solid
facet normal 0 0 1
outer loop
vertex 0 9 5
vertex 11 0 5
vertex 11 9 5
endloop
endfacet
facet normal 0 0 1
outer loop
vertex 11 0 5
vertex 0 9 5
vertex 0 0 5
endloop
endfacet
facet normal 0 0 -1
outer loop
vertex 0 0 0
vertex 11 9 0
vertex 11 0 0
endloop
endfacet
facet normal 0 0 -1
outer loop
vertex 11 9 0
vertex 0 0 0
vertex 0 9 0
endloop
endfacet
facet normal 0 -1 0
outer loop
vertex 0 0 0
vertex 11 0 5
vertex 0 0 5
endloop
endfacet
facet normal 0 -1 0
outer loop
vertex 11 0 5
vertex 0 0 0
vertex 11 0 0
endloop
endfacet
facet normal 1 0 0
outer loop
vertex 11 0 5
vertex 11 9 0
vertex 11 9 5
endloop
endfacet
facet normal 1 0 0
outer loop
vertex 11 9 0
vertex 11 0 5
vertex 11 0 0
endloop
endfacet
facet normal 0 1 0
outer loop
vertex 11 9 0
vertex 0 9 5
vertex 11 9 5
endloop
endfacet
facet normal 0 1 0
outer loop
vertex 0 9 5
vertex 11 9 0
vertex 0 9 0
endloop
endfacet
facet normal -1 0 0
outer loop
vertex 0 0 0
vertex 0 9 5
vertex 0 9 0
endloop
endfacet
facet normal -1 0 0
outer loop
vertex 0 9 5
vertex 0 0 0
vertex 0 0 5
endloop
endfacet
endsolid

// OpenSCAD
// Generated by SolidPython 1.0.1 on 2020-07-29 00:46:55


cube(size = [11, 9, 5]);
/***********************************************
*********      SolidPython code:      **********
************************************************
 
# import packages: SolidPython
from solid import *
from solid.utils import *
from itertools import chain, combinations, permutations


class Resize:

    def __init__(self, scad_file):
        self.scad_file = scad_file
        #self.scad_file = import_scad(scad_file)
        # cone/cylinder param:
        self.r1 = 0
        self.r2 = 0
        self.h = 0
        # rectangular prism param:
        self.w = 0
        self.l = 0
        # ellipse param:
        self.r = 0

    # import OpenScad code (file name corresponds to shape)


    # classify shape + parameters
    def assign(self, param1, param2, param3):
        if self.scad_file == 'cone.scad':
            self.r1 = param1
            self.r2 = param2
            self.h = param3
        elif self.scad_file == 'cylinder.scad':
            self.r1 = param1
            self.r2 = param2
            self.h = param3
        elif self.scad_file == 'rectangularPrism.scad':
            self.h = param1
            self.l = param2
            self.w = param3
        else:
            self.r = param1
            self.h = param2

    # resize parameters
    def iterate(self):
        x = range(3, 20, 2)
        i = 1
        if self.scad_file == 'cone.scad':
            tempList = list(permutations(x, 2))
            for temp in tempList:
                param1 = temp[0]
                param2 = temp[1]
                filepath = 'produced_scad_files/' + 'cone' + str(param1) + '_' + str(param2) + '_' + '.scad'
                scad_render_to_file(cylinder(h=param1, r1=param2, r2=0), filepath)

        elif self.scad_file == 'cylinder.scad':
            tempList = list(permutations(x, 3))
            for temp in tempList:
                param1 = temp[0]
                param2 = temp[1]
                filepath = 'produced_scad_files/' + 'cylinder' + str(param1) + '_' + str(param2) + '_' + '.scad'
                scad_render_to_file(cylinder(h=param1, r1=param2, r2=param2), filepath)

        elif self.scad_file == 'rectangularPrism.scad':
            tempList = list(permutations(x, 3))
            for temp in tempList:
                param1 = temp[0]
                param2 = temp[1]
                param3 = temp[2]
                filepath = 'produced_scad_files/' + 'rectangularPrism' + str(param1) + '_' + str(param2) + '_' + str(
                    param3) + '.scad'
                scad_render_to_file(cube(size=(param1, param2, param3)), filepath)

        elif self.scad_file == 'ellipse.scad':
            tempList = list(permutations(x, 4))
            for temp in tempList:
                param1 = temp[0]
                param2 = temp[1]
                param3 = temp[2]
                param4 = temp[3]
                filepath = 'produced_scad_files/' + 'ellipse' + str(param1) + '_' + str(param2) + '_' + str(param3) + '_' + str(param4) + '.scad'
                scad_render_to_file(scale([param1, param2, param3])(sphere(r=param4)), filepath)

    def render_to_scadfile(self):
        scad_render_to_file(scad, 'example.scad') 
 
************************************************/
